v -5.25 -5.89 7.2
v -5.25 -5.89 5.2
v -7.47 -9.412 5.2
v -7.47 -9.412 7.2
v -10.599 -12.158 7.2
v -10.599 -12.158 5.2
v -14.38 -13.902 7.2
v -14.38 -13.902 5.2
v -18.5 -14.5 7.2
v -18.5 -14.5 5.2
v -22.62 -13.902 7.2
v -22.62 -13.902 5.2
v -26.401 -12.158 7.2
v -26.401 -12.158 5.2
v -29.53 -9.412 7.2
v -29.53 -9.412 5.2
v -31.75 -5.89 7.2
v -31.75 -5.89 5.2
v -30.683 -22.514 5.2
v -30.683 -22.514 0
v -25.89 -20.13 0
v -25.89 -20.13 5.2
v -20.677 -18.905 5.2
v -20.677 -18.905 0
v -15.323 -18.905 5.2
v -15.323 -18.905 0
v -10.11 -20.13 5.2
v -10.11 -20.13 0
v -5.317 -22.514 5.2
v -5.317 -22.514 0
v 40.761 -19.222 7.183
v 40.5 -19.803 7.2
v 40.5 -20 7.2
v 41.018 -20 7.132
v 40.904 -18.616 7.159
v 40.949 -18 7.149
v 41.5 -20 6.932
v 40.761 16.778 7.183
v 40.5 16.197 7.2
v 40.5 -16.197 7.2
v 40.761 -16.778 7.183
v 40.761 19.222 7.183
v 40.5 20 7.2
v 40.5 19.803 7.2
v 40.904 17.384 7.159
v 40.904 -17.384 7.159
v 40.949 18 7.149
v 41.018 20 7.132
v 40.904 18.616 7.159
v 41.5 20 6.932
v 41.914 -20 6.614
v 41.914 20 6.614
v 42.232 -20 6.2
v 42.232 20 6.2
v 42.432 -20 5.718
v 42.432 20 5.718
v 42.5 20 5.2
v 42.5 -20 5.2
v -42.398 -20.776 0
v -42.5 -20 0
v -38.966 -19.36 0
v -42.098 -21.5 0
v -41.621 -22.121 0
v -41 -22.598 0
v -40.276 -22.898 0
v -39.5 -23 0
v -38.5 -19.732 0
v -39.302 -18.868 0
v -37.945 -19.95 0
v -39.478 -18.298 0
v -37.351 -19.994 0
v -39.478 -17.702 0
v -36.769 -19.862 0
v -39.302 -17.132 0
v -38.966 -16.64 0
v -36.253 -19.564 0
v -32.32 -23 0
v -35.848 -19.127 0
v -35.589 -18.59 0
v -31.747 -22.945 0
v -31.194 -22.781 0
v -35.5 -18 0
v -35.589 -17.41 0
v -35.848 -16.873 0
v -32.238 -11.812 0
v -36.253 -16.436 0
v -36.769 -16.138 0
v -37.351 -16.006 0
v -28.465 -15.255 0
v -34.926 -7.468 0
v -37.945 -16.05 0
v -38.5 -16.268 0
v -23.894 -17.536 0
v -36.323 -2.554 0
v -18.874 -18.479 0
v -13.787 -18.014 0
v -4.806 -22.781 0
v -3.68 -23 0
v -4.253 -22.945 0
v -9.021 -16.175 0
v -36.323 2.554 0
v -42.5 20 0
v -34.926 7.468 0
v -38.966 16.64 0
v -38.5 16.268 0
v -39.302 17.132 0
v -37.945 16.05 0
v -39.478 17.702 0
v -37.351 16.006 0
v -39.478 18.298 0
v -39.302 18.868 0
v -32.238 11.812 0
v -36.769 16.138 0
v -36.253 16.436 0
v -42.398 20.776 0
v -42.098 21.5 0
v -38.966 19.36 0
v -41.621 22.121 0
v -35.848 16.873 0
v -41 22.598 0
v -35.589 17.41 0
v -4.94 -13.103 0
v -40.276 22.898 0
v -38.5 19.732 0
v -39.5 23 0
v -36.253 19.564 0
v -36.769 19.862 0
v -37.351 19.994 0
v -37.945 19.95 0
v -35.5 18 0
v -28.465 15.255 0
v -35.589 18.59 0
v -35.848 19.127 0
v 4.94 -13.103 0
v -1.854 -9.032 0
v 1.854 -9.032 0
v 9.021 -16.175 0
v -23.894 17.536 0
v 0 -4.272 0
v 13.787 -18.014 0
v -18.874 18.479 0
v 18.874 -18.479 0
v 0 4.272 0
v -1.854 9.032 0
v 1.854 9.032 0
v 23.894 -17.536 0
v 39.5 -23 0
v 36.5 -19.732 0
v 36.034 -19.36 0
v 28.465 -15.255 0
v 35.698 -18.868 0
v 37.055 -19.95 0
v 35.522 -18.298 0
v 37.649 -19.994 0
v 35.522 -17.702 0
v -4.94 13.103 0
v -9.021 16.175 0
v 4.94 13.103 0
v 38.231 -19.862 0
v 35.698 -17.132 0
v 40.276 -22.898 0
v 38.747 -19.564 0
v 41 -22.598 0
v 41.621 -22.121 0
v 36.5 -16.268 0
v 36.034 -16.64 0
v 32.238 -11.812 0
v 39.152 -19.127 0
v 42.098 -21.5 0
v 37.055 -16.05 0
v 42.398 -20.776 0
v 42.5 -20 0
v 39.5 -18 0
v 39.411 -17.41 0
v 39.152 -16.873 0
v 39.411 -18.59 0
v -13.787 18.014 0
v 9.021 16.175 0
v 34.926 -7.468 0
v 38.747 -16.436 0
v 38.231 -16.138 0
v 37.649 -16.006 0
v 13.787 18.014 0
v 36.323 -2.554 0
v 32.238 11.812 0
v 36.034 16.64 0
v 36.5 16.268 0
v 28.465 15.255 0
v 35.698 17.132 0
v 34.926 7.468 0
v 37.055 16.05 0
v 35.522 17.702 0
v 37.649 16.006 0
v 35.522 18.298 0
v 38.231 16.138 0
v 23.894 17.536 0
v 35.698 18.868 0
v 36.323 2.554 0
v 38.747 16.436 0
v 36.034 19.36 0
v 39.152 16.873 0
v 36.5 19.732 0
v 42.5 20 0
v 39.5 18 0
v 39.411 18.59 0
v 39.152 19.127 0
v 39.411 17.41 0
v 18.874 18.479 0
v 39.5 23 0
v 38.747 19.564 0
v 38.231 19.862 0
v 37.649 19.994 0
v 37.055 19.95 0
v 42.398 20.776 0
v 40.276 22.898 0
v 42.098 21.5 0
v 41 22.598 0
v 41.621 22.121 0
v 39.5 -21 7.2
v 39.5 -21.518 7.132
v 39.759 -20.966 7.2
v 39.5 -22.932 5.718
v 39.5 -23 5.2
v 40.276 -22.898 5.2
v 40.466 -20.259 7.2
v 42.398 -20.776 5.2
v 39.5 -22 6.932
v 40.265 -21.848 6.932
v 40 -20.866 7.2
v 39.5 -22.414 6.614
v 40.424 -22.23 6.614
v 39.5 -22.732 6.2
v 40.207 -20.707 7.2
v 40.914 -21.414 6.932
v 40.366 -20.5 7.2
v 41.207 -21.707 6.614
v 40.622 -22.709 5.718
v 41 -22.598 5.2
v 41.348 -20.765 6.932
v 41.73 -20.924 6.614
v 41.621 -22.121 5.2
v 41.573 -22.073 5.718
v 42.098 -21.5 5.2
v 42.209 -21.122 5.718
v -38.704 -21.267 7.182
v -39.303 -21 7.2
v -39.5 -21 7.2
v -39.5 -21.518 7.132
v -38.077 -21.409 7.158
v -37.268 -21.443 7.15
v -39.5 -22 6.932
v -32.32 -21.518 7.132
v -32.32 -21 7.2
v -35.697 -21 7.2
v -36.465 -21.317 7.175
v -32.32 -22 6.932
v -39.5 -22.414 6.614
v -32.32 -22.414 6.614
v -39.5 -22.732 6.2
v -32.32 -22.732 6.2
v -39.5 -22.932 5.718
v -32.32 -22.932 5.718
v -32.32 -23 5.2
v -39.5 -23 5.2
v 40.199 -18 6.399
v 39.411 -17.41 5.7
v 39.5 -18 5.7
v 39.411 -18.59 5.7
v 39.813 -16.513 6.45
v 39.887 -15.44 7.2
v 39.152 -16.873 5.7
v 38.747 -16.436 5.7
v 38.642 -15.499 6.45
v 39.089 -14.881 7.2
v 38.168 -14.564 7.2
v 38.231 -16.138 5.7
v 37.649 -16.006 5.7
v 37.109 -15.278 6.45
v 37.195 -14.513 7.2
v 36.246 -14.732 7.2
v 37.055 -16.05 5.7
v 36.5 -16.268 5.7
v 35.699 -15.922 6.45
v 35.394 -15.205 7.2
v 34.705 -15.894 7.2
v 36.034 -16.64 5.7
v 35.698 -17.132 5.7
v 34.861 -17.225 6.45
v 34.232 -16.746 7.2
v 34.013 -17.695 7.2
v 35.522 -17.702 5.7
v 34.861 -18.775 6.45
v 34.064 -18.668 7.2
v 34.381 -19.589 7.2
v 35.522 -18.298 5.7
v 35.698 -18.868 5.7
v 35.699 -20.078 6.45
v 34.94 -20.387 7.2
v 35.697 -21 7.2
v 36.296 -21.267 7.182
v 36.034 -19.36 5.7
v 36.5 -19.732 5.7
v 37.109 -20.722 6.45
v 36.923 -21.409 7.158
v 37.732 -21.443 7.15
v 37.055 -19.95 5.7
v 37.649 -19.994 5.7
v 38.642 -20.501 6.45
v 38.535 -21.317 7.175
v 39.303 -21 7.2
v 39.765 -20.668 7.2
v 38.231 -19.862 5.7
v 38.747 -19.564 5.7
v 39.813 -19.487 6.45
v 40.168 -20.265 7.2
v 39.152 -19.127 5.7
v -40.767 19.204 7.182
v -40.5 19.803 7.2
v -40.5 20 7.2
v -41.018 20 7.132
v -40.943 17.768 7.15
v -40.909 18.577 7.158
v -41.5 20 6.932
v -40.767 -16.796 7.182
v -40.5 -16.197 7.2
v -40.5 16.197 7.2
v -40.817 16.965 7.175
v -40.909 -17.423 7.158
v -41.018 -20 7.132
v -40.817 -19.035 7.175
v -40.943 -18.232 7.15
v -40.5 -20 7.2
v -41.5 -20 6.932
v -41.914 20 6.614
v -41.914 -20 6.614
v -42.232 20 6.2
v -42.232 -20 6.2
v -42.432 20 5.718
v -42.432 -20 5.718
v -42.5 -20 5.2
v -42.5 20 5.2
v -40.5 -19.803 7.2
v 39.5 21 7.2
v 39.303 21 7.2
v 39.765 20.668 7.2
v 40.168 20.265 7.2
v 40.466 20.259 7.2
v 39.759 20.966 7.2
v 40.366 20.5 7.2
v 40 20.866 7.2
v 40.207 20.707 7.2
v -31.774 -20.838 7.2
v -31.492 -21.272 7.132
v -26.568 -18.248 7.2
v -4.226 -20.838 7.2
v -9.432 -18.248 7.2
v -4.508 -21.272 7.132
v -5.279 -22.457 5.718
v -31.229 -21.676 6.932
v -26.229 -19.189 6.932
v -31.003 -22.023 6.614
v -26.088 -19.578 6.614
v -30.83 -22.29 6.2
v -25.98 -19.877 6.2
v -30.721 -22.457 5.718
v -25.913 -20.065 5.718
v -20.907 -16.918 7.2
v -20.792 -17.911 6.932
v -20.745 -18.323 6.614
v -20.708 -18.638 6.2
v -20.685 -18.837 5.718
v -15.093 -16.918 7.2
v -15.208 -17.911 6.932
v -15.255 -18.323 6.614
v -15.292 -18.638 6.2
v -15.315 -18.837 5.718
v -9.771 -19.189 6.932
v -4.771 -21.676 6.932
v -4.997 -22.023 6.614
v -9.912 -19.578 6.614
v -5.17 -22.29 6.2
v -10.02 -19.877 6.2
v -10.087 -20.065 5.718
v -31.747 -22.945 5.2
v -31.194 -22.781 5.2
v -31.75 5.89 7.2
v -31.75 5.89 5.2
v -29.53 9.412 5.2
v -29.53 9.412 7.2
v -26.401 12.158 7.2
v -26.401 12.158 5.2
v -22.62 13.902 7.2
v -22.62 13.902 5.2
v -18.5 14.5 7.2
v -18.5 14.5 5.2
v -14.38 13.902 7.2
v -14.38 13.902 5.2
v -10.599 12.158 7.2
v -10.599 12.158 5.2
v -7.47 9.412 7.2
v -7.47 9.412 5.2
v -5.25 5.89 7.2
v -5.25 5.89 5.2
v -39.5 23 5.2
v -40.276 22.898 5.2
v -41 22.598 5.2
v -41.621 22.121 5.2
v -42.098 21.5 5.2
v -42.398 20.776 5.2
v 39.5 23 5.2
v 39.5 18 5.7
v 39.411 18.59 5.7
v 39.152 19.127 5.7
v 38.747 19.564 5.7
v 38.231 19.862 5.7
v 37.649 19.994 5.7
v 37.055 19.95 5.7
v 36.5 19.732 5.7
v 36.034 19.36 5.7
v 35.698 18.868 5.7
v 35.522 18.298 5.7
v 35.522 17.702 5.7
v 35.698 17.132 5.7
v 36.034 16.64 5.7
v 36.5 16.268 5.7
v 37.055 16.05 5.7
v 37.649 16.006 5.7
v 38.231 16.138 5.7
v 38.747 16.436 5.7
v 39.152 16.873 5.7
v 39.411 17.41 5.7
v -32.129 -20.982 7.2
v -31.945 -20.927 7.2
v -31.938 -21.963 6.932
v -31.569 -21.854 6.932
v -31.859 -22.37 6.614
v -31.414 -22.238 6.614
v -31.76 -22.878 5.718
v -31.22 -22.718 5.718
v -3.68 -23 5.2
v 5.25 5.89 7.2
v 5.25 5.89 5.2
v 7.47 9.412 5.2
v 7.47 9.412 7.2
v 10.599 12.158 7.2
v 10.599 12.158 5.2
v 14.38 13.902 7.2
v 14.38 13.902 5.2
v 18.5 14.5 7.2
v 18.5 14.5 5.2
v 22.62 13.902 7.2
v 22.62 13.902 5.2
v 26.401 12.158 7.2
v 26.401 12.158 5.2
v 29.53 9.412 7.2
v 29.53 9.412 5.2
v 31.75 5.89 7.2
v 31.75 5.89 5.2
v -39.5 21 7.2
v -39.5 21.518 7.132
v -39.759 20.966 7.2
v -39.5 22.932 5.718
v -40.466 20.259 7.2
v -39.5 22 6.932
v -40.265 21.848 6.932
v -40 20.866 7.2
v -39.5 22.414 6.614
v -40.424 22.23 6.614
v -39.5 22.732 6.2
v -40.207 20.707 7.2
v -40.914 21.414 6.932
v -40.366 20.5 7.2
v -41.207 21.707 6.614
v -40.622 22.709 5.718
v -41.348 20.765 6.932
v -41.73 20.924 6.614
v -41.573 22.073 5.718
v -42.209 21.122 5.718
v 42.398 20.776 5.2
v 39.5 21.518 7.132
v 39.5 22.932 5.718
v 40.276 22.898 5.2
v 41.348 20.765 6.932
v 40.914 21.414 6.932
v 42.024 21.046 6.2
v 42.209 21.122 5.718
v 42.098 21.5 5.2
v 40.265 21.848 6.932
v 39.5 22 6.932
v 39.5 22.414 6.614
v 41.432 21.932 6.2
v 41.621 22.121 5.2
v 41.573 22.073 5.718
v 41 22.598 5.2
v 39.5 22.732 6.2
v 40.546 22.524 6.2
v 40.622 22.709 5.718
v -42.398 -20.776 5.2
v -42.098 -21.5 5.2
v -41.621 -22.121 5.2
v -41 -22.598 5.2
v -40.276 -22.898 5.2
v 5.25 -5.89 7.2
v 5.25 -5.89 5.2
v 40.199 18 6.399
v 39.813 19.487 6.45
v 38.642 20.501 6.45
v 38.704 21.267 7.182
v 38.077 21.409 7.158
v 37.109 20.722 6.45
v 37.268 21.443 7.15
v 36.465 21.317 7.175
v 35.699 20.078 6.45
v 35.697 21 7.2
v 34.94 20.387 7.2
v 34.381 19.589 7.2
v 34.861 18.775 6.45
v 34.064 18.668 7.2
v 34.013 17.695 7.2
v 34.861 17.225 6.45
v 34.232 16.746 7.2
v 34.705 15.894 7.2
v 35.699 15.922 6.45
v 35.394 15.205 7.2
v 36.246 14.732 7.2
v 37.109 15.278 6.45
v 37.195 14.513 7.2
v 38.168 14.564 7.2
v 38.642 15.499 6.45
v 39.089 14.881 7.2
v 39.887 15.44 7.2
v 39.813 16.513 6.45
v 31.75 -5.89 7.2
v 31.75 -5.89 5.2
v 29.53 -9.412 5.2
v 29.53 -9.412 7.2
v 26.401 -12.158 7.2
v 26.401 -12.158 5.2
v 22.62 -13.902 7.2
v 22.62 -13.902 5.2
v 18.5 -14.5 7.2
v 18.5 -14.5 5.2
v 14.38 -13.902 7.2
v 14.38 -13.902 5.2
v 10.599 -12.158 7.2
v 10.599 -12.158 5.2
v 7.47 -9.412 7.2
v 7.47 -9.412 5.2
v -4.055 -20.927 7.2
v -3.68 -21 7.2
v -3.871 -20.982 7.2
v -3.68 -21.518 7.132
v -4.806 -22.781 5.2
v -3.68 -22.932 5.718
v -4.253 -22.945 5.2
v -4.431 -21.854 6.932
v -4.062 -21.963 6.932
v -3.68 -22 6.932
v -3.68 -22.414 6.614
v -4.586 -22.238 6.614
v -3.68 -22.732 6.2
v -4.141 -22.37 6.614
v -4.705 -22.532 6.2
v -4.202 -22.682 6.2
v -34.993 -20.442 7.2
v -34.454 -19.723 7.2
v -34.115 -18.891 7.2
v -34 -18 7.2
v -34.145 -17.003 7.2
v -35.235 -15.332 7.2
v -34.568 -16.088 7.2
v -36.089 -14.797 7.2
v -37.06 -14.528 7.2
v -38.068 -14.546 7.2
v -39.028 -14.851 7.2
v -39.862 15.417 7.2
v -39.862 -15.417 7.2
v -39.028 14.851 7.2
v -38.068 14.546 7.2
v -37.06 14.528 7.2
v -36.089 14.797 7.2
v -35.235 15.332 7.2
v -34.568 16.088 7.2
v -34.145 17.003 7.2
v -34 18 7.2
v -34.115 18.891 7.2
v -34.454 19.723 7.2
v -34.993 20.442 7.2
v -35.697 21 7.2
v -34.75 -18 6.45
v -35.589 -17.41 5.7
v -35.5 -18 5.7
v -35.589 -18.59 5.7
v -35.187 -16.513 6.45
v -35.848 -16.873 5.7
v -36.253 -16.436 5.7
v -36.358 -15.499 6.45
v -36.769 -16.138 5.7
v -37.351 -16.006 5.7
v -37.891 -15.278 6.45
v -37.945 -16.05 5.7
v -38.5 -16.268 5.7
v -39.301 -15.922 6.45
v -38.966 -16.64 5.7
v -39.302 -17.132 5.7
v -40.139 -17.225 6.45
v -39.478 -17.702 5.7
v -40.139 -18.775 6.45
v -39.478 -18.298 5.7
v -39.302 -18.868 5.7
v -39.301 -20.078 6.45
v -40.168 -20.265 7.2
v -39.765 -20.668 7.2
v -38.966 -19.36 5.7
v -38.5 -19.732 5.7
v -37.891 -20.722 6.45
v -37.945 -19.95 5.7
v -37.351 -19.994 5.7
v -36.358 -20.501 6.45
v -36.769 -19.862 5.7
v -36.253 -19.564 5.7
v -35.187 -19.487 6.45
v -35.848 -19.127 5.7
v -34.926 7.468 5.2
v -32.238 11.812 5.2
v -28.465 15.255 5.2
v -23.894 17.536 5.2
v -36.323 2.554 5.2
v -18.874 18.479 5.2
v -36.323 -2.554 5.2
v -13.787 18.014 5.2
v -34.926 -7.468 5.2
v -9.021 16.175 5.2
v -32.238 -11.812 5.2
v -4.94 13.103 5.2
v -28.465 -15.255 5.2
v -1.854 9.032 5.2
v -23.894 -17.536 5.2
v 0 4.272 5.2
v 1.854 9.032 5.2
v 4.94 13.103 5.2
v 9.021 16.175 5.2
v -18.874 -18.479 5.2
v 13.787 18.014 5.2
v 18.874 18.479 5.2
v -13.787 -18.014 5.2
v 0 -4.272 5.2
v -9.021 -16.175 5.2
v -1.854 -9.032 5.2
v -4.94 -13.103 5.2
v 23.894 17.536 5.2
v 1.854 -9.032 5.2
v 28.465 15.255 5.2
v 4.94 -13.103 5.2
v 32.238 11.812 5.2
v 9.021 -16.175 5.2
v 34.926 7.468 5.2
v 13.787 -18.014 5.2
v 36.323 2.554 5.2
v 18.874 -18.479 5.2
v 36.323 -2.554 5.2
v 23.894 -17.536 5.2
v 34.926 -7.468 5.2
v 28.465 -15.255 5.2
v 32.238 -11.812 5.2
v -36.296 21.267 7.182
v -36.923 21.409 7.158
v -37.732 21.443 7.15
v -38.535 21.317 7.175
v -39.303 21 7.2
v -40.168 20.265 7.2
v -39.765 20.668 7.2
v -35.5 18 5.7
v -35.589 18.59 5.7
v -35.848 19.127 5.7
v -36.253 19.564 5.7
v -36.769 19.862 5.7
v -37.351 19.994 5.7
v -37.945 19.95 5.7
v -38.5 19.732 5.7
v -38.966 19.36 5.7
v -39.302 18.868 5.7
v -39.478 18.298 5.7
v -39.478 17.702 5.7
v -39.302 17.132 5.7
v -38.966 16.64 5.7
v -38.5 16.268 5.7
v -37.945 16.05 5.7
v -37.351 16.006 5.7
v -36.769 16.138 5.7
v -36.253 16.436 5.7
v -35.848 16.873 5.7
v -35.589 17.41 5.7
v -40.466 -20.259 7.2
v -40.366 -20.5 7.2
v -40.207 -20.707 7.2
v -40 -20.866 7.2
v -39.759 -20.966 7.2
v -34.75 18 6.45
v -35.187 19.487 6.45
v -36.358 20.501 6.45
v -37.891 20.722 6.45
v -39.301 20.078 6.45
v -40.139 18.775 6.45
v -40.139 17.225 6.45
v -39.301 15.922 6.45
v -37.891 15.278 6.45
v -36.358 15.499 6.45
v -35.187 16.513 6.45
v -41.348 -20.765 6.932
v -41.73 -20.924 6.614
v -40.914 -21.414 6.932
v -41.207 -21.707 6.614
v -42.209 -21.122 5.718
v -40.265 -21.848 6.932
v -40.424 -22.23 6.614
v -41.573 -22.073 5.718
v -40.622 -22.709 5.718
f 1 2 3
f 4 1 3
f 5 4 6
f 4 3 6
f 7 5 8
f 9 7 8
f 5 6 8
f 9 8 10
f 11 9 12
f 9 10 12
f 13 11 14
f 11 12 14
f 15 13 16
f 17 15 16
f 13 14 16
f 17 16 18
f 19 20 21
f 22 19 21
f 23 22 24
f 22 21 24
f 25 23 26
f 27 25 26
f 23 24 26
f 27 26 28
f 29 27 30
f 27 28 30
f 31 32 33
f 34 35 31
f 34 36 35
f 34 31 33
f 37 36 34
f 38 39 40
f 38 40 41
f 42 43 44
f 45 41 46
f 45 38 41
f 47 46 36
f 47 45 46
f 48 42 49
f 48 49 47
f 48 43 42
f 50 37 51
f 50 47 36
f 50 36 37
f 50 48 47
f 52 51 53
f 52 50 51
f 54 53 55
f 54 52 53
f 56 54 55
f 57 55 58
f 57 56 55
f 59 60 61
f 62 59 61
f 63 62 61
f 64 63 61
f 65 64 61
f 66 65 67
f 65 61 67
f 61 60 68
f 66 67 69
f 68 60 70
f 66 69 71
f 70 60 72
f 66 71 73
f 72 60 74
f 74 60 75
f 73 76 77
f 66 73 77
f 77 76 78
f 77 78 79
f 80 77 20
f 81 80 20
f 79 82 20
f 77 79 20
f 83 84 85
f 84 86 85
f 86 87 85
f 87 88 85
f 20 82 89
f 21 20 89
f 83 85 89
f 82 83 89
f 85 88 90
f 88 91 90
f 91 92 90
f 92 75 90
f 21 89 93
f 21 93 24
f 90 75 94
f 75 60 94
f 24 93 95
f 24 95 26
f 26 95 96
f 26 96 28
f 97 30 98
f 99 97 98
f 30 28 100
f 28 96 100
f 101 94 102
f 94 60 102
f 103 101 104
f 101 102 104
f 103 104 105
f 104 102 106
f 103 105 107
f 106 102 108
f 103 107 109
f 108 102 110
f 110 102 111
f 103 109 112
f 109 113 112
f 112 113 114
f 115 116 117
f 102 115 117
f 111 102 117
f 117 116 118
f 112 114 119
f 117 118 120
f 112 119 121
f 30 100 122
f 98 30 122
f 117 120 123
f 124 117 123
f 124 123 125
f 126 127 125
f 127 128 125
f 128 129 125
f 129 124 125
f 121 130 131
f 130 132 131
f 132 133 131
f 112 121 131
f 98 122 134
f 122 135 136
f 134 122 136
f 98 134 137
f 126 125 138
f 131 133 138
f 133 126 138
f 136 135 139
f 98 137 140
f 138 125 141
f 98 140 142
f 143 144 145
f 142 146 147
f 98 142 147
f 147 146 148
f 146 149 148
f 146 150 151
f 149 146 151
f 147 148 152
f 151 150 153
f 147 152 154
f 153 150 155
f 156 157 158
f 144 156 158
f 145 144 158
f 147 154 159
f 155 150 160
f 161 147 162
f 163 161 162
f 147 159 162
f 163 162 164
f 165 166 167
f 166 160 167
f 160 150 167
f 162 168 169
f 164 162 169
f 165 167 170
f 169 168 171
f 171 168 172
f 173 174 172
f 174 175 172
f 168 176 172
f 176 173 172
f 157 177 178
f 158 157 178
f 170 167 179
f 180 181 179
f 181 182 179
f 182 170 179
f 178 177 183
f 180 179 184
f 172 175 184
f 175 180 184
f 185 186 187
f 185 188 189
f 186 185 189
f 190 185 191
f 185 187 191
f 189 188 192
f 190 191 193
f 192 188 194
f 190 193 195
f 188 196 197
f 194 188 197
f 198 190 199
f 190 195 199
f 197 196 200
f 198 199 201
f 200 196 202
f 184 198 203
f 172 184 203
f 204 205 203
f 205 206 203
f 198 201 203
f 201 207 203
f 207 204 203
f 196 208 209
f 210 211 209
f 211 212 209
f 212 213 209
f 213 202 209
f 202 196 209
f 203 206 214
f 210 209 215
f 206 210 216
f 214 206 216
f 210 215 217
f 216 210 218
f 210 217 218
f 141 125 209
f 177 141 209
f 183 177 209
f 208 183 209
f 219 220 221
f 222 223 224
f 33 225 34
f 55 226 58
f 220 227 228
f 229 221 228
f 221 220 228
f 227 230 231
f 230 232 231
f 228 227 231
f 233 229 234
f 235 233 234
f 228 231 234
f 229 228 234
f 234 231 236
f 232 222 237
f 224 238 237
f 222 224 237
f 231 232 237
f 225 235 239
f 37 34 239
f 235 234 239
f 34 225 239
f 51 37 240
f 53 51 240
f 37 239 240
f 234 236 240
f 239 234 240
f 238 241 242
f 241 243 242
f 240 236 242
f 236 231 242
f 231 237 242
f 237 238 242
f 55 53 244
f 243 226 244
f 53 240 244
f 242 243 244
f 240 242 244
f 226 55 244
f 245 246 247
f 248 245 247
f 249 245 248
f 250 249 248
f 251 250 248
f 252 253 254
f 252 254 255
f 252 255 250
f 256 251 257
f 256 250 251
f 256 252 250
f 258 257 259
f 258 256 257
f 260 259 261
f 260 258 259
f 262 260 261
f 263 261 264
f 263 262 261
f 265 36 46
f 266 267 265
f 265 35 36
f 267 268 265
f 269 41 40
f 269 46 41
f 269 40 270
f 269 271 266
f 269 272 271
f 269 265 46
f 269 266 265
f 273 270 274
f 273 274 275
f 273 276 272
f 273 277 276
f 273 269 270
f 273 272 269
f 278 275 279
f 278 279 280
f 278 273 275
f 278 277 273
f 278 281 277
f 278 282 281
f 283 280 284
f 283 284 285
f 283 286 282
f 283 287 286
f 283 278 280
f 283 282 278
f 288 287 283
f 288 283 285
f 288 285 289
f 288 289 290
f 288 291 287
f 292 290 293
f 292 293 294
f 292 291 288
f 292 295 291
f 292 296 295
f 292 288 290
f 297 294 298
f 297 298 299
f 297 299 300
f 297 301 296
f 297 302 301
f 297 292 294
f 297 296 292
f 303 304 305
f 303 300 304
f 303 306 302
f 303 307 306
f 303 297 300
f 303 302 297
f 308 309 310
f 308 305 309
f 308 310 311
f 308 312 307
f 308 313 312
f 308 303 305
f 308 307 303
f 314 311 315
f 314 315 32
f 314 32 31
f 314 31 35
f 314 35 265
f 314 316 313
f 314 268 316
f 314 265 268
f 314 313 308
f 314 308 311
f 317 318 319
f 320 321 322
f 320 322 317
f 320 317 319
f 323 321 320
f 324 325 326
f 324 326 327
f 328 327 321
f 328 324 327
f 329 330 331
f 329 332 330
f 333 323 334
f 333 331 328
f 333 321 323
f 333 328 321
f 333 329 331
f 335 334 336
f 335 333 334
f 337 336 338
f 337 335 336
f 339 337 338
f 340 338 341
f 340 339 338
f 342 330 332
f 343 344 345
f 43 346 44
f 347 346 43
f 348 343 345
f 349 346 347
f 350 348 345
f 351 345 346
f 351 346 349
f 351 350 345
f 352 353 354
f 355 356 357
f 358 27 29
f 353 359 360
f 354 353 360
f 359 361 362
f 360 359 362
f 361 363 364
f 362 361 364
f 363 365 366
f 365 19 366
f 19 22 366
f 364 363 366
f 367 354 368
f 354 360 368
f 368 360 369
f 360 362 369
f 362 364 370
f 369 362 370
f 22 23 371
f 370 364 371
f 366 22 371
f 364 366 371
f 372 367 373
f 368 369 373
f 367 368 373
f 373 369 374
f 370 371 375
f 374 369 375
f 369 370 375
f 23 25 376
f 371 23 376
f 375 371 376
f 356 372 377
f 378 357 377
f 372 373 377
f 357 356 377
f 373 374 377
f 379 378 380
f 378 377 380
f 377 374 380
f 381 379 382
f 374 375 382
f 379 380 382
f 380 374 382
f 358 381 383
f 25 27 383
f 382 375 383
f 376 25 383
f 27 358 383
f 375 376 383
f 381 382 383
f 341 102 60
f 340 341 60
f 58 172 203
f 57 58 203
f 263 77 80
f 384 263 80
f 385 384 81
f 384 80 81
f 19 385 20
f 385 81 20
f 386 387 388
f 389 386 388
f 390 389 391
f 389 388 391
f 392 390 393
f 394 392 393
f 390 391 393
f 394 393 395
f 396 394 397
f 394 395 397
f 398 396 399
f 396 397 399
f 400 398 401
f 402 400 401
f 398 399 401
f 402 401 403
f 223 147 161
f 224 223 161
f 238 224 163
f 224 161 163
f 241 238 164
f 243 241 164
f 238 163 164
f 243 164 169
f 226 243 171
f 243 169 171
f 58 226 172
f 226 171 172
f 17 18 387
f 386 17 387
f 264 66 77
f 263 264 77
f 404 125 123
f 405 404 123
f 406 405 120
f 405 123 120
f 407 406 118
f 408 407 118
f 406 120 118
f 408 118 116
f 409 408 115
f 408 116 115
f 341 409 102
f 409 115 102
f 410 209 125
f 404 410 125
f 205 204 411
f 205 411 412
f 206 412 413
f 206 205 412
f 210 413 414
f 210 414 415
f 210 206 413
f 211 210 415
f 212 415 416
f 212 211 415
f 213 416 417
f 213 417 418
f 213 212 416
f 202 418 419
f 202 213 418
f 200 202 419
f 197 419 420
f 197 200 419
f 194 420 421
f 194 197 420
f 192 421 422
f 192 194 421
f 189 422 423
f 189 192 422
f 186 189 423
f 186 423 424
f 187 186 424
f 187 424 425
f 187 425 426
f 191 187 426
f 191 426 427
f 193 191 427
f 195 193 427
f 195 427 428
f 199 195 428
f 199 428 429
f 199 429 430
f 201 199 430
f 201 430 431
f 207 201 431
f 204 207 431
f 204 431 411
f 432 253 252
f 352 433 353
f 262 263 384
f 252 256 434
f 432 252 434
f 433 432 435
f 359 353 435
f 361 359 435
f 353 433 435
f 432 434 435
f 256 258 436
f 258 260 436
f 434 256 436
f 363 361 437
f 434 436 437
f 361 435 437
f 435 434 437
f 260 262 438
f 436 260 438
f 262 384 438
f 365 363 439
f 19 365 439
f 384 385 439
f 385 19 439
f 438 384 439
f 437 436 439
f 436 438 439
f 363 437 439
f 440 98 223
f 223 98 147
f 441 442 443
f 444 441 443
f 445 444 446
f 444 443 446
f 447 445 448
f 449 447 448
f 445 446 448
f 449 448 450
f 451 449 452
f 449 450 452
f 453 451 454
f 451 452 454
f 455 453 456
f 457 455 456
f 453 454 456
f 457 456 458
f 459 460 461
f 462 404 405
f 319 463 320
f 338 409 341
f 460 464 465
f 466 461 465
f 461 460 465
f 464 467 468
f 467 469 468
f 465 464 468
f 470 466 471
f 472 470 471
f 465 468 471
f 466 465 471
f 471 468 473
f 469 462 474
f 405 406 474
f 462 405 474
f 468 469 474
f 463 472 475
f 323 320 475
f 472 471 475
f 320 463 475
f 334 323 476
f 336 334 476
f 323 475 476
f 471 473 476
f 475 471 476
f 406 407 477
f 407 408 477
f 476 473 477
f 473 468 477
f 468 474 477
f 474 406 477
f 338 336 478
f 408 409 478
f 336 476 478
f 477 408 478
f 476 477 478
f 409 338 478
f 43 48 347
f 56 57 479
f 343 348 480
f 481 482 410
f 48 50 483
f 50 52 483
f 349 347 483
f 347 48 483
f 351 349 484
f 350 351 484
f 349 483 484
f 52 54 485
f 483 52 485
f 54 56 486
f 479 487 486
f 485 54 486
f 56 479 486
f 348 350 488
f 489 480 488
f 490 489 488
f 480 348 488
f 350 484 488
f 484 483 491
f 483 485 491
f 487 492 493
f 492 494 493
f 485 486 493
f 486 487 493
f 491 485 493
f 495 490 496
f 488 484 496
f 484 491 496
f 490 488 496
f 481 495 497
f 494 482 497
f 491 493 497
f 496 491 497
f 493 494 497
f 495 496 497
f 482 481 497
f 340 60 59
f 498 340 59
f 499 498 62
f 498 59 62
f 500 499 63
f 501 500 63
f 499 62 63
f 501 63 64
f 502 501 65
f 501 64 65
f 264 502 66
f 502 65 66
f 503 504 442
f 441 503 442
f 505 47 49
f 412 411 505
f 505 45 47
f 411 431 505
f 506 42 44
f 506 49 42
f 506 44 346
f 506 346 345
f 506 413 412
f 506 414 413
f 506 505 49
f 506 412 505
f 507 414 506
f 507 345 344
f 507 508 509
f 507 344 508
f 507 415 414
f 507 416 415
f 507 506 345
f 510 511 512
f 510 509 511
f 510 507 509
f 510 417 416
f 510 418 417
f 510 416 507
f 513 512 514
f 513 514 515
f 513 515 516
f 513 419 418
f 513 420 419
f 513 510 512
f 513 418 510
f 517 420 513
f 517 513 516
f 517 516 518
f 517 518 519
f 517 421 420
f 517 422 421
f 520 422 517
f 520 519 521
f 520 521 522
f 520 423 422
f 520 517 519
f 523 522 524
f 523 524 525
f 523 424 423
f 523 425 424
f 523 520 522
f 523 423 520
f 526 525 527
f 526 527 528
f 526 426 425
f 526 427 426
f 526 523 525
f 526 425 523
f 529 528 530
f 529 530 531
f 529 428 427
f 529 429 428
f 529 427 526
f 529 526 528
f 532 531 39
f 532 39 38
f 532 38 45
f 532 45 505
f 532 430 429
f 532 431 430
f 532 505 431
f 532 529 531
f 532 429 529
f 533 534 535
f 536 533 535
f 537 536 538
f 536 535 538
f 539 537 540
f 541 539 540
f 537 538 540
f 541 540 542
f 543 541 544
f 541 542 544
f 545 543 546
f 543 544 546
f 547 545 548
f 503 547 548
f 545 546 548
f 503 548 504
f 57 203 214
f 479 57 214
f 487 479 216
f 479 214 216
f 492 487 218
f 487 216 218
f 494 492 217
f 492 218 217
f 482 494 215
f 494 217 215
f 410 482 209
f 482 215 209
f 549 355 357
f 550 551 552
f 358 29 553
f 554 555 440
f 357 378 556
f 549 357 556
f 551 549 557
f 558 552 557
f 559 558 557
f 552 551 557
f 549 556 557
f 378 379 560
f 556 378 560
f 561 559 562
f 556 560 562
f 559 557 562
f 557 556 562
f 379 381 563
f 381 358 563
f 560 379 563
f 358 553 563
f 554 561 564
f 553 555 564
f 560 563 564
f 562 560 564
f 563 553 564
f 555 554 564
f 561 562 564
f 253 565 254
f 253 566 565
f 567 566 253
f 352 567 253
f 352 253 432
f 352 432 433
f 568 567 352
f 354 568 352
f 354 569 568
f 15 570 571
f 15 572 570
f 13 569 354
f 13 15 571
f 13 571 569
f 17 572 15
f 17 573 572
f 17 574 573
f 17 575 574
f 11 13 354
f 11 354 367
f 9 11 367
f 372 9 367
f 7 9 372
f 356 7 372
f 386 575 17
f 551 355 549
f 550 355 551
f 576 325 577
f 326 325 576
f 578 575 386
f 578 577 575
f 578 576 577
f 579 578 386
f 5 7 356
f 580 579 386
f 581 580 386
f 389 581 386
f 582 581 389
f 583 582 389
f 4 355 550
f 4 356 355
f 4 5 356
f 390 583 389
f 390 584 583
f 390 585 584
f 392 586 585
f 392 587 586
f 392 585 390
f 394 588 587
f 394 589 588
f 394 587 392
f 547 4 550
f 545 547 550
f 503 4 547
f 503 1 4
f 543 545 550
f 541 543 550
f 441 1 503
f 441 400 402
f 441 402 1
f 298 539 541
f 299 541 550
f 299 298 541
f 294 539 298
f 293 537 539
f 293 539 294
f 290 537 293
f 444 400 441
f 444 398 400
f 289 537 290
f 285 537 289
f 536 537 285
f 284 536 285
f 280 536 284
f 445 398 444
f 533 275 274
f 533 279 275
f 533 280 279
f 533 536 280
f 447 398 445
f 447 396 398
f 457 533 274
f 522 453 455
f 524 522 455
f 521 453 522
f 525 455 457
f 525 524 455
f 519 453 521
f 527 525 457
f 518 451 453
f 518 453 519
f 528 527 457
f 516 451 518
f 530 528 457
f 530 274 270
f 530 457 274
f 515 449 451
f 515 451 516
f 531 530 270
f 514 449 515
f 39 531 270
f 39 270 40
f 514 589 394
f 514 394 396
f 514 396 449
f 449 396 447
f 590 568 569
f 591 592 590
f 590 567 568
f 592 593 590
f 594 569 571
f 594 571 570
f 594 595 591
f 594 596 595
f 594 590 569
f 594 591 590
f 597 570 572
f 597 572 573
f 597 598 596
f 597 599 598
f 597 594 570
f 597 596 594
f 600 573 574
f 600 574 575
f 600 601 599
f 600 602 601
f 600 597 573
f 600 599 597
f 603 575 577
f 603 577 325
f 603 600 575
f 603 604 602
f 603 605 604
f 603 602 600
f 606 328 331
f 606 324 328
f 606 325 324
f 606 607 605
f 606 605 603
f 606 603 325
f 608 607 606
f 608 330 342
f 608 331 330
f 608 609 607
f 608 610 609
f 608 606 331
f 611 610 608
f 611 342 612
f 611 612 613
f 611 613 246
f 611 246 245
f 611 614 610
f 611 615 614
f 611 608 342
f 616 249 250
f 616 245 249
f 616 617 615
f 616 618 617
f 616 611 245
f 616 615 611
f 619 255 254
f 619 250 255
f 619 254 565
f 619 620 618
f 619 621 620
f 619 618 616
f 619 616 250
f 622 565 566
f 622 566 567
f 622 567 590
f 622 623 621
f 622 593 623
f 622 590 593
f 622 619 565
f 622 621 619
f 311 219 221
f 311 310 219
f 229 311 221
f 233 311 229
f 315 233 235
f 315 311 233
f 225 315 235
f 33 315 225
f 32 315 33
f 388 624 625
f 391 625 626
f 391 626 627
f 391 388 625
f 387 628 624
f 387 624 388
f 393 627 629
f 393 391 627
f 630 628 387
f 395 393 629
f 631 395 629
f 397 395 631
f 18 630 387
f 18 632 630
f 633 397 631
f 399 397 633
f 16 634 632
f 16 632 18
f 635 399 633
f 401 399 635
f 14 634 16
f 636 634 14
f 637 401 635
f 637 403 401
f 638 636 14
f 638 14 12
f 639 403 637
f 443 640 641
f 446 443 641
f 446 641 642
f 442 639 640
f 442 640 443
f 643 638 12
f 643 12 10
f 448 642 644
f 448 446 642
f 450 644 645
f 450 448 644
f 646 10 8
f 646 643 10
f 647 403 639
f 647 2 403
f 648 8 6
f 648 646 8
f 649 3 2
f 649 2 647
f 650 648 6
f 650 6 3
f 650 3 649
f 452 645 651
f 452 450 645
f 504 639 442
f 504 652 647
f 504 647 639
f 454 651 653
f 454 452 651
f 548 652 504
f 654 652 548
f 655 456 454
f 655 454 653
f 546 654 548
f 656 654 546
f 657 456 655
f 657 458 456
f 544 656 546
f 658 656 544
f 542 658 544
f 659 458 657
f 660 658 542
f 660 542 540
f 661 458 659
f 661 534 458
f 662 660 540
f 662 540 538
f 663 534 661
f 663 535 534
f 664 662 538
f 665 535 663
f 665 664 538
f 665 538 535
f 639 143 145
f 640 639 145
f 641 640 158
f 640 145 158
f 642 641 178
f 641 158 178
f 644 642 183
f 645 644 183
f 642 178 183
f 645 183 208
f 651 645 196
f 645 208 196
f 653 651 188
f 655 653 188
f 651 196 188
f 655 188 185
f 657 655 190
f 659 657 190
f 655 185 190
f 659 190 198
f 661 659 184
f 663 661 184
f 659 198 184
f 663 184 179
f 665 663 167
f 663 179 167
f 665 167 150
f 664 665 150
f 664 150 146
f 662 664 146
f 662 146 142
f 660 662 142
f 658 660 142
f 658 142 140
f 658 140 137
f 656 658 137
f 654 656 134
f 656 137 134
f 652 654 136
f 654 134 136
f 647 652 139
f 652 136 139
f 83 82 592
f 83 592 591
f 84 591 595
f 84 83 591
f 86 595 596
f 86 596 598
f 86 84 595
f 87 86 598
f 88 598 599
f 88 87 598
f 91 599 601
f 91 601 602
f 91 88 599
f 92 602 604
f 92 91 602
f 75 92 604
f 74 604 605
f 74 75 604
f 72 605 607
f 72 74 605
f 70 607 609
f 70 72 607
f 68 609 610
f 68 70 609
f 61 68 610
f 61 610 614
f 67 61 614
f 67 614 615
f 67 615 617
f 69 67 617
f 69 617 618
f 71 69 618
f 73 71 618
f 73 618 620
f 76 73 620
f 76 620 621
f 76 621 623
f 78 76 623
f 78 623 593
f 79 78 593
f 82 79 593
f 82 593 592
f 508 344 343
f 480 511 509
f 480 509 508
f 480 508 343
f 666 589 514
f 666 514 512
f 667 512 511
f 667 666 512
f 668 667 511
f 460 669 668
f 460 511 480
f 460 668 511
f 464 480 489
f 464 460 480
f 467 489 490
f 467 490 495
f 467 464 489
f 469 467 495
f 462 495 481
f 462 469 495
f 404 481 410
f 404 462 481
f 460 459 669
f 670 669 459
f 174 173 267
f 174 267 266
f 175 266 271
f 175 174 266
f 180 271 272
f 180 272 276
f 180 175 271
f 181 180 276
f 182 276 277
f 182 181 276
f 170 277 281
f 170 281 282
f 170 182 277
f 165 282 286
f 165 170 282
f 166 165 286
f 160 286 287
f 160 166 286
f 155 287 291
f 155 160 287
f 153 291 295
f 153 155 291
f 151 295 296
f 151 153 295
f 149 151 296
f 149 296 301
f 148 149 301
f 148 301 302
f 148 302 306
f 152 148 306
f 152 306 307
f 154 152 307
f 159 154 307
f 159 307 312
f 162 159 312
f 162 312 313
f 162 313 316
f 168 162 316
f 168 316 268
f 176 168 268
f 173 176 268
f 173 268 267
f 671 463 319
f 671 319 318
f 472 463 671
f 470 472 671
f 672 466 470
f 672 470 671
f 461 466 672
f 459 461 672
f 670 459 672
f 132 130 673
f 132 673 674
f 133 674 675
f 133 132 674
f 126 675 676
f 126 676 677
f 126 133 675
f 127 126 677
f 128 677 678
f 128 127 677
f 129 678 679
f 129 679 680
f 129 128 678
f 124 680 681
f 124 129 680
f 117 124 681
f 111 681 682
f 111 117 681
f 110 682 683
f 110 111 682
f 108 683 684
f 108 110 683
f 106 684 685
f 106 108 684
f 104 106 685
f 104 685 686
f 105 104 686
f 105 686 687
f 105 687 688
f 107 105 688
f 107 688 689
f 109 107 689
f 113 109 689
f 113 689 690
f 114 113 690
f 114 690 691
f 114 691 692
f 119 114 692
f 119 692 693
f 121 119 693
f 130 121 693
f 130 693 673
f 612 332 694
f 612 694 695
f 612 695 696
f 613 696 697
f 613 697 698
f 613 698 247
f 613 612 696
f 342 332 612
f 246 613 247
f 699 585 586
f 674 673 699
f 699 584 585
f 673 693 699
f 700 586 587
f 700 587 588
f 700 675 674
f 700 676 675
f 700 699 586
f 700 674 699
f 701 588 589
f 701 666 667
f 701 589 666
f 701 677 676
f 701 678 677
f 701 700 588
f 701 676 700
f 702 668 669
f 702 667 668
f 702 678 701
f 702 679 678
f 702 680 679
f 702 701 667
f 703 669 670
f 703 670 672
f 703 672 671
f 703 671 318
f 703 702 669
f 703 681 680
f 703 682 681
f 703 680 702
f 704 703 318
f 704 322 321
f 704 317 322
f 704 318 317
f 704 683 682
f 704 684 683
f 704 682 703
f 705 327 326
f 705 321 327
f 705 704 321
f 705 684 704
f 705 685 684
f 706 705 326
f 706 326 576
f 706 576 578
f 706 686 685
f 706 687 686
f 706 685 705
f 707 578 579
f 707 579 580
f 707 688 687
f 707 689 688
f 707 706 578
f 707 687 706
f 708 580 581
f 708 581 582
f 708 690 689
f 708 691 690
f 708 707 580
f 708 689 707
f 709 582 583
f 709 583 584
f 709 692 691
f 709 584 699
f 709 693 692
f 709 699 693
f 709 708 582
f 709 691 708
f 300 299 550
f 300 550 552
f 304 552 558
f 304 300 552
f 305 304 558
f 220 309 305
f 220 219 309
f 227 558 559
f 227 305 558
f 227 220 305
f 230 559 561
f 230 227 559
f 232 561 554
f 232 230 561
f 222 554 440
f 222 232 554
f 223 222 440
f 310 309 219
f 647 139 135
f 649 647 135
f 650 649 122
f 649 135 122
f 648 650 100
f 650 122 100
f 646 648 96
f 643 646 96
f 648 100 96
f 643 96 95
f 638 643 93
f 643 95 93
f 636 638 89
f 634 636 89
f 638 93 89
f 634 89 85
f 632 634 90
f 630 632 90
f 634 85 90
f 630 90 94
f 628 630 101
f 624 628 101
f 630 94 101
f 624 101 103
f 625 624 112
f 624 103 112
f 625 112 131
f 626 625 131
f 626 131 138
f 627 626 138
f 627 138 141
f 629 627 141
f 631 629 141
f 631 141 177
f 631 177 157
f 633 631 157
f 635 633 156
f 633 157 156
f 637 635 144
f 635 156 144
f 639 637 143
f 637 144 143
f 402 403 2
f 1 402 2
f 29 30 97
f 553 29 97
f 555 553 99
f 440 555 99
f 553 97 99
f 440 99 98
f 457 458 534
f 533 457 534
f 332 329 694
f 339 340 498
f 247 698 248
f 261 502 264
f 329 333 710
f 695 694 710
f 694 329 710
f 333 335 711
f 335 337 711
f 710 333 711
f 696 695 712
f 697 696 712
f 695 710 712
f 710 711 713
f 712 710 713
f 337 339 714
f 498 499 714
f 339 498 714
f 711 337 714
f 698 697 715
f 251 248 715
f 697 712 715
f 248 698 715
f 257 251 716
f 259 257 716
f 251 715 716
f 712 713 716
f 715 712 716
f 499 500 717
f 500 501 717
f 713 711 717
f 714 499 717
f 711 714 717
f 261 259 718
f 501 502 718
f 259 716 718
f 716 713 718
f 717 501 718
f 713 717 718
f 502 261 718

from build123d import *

# Parameters (mm, degrees)
F0_R     = 2
F1_DEPTH = 7.2
F3_DEPTH = 5.2
F4_R     = 2


# Not quite as in the source:
# - a fillet or chamfer that OpenCascade refuses, or shapes differently, is made with other operations: its cross-section is extruded or revolved along the edge and cut away or added
# - a feature names something its author has since deleted; it is built from what else it names


with BuildPart() as f1:
    # F0 (on Top) → F1 (new body)
    with BuildSketch(Plane.XY):
        with BuildLine():
            Line((-3.6799965084, -23), (39.5, -23))
            ThreePointArc((39.5, -23), (41.6213203436, -22.1213203436), (42.5, -20))
            Line((42.5, -20), (42.5, 20))
            ThreePointArc((42.5, 20), (41.6213203436, 22.1213203436), (39.5, 23))
            Line((39.5, 23), (-39.5, 23))
            ThreePointArc((-39.5, 23), (-41.6213203436, 22.1213203436), (-42.5, 20))
            Line((-42.5, 20), (-42.5, 0))
            Line((-42.5, 0), (-42.5, -20))
            ThreePointArc((-42.5, -20), (-41.6213203436, -22.1213203436), (-39.5, -23))
            Line((-39.5, -23), (-32.3200034916, -23))
            ThreePointArc((-32.3200034916, -23), (-31.4664395347, -22.8760091397), (-30.683431664, -22.5142857143))
            ThreePointArc((-30.683431664, -22.5142857143), (-18, -18.75), (-5.316568336, -22.5142857143))
            ThreePointArc((-5.316568336, -22.5142857143), (-4.5335604653, -22.8760091397), (-3.6799965084, -23))
        make_face()
        with Locations((-37.5, -18)):
            Circle(F0_R, mode=Mode.SUBTRACT)
        with Locations((37.5, -18)):
            Circle(F0_R, mode=Mode.SUBTRACT)
        with BuildLine():
            ThreePointArc((-31.75, 5.8896094947), (-18.5, 14.5), (-5.25, 5.8896094947))
            Line((-5.25, 5.8896094947), (-5.25, -5.8896094947))
            ThreePointArc((-5.25, -5.8896094947), (-18.5, -14.5), (-31.75, -5.8896094947))
            Line((-31.75, -5.8896094947), (-31.75, 5.8896094947))
        make_face(mode=Mode.SUBTRACT)
        with Locations((-37.5, 18)):
            Circle(F0_R, mode=Mode.SUBTRACT)
        with BuildLine():
            ThreePointArc((31.75, -5.8896094947), (18.5, -14.5), (5.25, -5.8896094947))
            Line((5.25, -5.8896094947), (5.25, 5.8896094947))
            ThreePointArc((5.25, 5.8896094947), (18.5, 14.5), (31.75, 5.8896094947))
            Line((31.75, 5.8896094947), (31.75, -5.8896094947))
        make_face(mode=Mode.SUBTRACT)
        with Locations((37.5, 18)):
            Circle(F0_R, mode=Mode.SUBTRACT)
    extrude(amount=F1_DEPTH)

    # F2 (on face) → F3 (cut)
    with BuildSketch(Plane(origin=(0, 0, 0), x_dir=(1, 0, 0), z_dir=(0, 0, -1))):
        with BuildLine():
            ThreePointArc((0, 4.2720018727), (-36.5, 0), (0, -4.2720018727))
            ThreePointArc((0, -4.2720018727), (36.5, 0), (0, 4.2720018727))
        make_face()
    extrude(amount=-F3_DEPTH, mode=Mode.SUBTRACT)

    # F4
    f4_edges = [f1.edges().sort_by_distance(p)[0] for p in [
        (0, 23, 7.2),
        (-41.62132, 22.12132, 7.2),
        (-42.5, 0, 7.2),
        (-41.62132, -22.12132, 7.2),
        (-35.910002, -23, 7.2),
        (17.910002, -23, 7.2),
        (41.62132, -22.12132, 7.2),
        (42.5, 0, 7.2),
        (41.62132, 22.12132, 7.2),
        (-18, -18.75, 7.2),
        (-31.46644, -22.876009, 7.2),
        (-4.53356, -22.876009, 7.2),
    ]]
    fillet(f4_edges, radius=F4_R)

    # F5: chamfer of 1.5 on 4 edges, made by hand

    # F5_s1 → F5_t2 (revolve, cut)
    with BuildSketch(Plane.XZ.offset(-18)):
        Polygon((-34, 7.2), (-35.5, 5.7), (-35.5, 7.2), align=None)
    revolve(axis=Axis((-37.5, 18, 7.2), (0, 0, 1)), mode=Mode.SUBTRACT)

    # F5_s3 → F5_t4 (revolve, cut)
    with BuildSketch(Plane.XZ.offset(18)):
        Polygon((-34, 7.2), (-35.5, 5.7), (-35.5, 7.2), align=None)
    revolve(axis=Axis((-37.5, -18, 7.2), (0, 0, 1)), mode=Mode.SUBTRACT)

    # F5_s5 → F5_t6 (revolve, cut)
    with BuildSketch(Plane.XZ.offset(18)):
        Polygon((41, 7.2), (39.5, 5.7), (39.5, 7.2), align=None)
    revolve(axis=Axis((37.5, -18, 7.2), (0, 0, 1)), mode=Mode.SUBTRACT)

    # F5_s7 → F5_t8 (revolve, cut)
    with BuildSketch(Plane.XZ.offset(-18)):
        Polygon((41, 7.2), (39.5, 5.7), (39.5, 7.2), align=None)
    revolve(axis=Axis((37.5, 18, 7.2), (0, 0, 1)), mode=Mode.SUBTRACT)


solid = f1.part
